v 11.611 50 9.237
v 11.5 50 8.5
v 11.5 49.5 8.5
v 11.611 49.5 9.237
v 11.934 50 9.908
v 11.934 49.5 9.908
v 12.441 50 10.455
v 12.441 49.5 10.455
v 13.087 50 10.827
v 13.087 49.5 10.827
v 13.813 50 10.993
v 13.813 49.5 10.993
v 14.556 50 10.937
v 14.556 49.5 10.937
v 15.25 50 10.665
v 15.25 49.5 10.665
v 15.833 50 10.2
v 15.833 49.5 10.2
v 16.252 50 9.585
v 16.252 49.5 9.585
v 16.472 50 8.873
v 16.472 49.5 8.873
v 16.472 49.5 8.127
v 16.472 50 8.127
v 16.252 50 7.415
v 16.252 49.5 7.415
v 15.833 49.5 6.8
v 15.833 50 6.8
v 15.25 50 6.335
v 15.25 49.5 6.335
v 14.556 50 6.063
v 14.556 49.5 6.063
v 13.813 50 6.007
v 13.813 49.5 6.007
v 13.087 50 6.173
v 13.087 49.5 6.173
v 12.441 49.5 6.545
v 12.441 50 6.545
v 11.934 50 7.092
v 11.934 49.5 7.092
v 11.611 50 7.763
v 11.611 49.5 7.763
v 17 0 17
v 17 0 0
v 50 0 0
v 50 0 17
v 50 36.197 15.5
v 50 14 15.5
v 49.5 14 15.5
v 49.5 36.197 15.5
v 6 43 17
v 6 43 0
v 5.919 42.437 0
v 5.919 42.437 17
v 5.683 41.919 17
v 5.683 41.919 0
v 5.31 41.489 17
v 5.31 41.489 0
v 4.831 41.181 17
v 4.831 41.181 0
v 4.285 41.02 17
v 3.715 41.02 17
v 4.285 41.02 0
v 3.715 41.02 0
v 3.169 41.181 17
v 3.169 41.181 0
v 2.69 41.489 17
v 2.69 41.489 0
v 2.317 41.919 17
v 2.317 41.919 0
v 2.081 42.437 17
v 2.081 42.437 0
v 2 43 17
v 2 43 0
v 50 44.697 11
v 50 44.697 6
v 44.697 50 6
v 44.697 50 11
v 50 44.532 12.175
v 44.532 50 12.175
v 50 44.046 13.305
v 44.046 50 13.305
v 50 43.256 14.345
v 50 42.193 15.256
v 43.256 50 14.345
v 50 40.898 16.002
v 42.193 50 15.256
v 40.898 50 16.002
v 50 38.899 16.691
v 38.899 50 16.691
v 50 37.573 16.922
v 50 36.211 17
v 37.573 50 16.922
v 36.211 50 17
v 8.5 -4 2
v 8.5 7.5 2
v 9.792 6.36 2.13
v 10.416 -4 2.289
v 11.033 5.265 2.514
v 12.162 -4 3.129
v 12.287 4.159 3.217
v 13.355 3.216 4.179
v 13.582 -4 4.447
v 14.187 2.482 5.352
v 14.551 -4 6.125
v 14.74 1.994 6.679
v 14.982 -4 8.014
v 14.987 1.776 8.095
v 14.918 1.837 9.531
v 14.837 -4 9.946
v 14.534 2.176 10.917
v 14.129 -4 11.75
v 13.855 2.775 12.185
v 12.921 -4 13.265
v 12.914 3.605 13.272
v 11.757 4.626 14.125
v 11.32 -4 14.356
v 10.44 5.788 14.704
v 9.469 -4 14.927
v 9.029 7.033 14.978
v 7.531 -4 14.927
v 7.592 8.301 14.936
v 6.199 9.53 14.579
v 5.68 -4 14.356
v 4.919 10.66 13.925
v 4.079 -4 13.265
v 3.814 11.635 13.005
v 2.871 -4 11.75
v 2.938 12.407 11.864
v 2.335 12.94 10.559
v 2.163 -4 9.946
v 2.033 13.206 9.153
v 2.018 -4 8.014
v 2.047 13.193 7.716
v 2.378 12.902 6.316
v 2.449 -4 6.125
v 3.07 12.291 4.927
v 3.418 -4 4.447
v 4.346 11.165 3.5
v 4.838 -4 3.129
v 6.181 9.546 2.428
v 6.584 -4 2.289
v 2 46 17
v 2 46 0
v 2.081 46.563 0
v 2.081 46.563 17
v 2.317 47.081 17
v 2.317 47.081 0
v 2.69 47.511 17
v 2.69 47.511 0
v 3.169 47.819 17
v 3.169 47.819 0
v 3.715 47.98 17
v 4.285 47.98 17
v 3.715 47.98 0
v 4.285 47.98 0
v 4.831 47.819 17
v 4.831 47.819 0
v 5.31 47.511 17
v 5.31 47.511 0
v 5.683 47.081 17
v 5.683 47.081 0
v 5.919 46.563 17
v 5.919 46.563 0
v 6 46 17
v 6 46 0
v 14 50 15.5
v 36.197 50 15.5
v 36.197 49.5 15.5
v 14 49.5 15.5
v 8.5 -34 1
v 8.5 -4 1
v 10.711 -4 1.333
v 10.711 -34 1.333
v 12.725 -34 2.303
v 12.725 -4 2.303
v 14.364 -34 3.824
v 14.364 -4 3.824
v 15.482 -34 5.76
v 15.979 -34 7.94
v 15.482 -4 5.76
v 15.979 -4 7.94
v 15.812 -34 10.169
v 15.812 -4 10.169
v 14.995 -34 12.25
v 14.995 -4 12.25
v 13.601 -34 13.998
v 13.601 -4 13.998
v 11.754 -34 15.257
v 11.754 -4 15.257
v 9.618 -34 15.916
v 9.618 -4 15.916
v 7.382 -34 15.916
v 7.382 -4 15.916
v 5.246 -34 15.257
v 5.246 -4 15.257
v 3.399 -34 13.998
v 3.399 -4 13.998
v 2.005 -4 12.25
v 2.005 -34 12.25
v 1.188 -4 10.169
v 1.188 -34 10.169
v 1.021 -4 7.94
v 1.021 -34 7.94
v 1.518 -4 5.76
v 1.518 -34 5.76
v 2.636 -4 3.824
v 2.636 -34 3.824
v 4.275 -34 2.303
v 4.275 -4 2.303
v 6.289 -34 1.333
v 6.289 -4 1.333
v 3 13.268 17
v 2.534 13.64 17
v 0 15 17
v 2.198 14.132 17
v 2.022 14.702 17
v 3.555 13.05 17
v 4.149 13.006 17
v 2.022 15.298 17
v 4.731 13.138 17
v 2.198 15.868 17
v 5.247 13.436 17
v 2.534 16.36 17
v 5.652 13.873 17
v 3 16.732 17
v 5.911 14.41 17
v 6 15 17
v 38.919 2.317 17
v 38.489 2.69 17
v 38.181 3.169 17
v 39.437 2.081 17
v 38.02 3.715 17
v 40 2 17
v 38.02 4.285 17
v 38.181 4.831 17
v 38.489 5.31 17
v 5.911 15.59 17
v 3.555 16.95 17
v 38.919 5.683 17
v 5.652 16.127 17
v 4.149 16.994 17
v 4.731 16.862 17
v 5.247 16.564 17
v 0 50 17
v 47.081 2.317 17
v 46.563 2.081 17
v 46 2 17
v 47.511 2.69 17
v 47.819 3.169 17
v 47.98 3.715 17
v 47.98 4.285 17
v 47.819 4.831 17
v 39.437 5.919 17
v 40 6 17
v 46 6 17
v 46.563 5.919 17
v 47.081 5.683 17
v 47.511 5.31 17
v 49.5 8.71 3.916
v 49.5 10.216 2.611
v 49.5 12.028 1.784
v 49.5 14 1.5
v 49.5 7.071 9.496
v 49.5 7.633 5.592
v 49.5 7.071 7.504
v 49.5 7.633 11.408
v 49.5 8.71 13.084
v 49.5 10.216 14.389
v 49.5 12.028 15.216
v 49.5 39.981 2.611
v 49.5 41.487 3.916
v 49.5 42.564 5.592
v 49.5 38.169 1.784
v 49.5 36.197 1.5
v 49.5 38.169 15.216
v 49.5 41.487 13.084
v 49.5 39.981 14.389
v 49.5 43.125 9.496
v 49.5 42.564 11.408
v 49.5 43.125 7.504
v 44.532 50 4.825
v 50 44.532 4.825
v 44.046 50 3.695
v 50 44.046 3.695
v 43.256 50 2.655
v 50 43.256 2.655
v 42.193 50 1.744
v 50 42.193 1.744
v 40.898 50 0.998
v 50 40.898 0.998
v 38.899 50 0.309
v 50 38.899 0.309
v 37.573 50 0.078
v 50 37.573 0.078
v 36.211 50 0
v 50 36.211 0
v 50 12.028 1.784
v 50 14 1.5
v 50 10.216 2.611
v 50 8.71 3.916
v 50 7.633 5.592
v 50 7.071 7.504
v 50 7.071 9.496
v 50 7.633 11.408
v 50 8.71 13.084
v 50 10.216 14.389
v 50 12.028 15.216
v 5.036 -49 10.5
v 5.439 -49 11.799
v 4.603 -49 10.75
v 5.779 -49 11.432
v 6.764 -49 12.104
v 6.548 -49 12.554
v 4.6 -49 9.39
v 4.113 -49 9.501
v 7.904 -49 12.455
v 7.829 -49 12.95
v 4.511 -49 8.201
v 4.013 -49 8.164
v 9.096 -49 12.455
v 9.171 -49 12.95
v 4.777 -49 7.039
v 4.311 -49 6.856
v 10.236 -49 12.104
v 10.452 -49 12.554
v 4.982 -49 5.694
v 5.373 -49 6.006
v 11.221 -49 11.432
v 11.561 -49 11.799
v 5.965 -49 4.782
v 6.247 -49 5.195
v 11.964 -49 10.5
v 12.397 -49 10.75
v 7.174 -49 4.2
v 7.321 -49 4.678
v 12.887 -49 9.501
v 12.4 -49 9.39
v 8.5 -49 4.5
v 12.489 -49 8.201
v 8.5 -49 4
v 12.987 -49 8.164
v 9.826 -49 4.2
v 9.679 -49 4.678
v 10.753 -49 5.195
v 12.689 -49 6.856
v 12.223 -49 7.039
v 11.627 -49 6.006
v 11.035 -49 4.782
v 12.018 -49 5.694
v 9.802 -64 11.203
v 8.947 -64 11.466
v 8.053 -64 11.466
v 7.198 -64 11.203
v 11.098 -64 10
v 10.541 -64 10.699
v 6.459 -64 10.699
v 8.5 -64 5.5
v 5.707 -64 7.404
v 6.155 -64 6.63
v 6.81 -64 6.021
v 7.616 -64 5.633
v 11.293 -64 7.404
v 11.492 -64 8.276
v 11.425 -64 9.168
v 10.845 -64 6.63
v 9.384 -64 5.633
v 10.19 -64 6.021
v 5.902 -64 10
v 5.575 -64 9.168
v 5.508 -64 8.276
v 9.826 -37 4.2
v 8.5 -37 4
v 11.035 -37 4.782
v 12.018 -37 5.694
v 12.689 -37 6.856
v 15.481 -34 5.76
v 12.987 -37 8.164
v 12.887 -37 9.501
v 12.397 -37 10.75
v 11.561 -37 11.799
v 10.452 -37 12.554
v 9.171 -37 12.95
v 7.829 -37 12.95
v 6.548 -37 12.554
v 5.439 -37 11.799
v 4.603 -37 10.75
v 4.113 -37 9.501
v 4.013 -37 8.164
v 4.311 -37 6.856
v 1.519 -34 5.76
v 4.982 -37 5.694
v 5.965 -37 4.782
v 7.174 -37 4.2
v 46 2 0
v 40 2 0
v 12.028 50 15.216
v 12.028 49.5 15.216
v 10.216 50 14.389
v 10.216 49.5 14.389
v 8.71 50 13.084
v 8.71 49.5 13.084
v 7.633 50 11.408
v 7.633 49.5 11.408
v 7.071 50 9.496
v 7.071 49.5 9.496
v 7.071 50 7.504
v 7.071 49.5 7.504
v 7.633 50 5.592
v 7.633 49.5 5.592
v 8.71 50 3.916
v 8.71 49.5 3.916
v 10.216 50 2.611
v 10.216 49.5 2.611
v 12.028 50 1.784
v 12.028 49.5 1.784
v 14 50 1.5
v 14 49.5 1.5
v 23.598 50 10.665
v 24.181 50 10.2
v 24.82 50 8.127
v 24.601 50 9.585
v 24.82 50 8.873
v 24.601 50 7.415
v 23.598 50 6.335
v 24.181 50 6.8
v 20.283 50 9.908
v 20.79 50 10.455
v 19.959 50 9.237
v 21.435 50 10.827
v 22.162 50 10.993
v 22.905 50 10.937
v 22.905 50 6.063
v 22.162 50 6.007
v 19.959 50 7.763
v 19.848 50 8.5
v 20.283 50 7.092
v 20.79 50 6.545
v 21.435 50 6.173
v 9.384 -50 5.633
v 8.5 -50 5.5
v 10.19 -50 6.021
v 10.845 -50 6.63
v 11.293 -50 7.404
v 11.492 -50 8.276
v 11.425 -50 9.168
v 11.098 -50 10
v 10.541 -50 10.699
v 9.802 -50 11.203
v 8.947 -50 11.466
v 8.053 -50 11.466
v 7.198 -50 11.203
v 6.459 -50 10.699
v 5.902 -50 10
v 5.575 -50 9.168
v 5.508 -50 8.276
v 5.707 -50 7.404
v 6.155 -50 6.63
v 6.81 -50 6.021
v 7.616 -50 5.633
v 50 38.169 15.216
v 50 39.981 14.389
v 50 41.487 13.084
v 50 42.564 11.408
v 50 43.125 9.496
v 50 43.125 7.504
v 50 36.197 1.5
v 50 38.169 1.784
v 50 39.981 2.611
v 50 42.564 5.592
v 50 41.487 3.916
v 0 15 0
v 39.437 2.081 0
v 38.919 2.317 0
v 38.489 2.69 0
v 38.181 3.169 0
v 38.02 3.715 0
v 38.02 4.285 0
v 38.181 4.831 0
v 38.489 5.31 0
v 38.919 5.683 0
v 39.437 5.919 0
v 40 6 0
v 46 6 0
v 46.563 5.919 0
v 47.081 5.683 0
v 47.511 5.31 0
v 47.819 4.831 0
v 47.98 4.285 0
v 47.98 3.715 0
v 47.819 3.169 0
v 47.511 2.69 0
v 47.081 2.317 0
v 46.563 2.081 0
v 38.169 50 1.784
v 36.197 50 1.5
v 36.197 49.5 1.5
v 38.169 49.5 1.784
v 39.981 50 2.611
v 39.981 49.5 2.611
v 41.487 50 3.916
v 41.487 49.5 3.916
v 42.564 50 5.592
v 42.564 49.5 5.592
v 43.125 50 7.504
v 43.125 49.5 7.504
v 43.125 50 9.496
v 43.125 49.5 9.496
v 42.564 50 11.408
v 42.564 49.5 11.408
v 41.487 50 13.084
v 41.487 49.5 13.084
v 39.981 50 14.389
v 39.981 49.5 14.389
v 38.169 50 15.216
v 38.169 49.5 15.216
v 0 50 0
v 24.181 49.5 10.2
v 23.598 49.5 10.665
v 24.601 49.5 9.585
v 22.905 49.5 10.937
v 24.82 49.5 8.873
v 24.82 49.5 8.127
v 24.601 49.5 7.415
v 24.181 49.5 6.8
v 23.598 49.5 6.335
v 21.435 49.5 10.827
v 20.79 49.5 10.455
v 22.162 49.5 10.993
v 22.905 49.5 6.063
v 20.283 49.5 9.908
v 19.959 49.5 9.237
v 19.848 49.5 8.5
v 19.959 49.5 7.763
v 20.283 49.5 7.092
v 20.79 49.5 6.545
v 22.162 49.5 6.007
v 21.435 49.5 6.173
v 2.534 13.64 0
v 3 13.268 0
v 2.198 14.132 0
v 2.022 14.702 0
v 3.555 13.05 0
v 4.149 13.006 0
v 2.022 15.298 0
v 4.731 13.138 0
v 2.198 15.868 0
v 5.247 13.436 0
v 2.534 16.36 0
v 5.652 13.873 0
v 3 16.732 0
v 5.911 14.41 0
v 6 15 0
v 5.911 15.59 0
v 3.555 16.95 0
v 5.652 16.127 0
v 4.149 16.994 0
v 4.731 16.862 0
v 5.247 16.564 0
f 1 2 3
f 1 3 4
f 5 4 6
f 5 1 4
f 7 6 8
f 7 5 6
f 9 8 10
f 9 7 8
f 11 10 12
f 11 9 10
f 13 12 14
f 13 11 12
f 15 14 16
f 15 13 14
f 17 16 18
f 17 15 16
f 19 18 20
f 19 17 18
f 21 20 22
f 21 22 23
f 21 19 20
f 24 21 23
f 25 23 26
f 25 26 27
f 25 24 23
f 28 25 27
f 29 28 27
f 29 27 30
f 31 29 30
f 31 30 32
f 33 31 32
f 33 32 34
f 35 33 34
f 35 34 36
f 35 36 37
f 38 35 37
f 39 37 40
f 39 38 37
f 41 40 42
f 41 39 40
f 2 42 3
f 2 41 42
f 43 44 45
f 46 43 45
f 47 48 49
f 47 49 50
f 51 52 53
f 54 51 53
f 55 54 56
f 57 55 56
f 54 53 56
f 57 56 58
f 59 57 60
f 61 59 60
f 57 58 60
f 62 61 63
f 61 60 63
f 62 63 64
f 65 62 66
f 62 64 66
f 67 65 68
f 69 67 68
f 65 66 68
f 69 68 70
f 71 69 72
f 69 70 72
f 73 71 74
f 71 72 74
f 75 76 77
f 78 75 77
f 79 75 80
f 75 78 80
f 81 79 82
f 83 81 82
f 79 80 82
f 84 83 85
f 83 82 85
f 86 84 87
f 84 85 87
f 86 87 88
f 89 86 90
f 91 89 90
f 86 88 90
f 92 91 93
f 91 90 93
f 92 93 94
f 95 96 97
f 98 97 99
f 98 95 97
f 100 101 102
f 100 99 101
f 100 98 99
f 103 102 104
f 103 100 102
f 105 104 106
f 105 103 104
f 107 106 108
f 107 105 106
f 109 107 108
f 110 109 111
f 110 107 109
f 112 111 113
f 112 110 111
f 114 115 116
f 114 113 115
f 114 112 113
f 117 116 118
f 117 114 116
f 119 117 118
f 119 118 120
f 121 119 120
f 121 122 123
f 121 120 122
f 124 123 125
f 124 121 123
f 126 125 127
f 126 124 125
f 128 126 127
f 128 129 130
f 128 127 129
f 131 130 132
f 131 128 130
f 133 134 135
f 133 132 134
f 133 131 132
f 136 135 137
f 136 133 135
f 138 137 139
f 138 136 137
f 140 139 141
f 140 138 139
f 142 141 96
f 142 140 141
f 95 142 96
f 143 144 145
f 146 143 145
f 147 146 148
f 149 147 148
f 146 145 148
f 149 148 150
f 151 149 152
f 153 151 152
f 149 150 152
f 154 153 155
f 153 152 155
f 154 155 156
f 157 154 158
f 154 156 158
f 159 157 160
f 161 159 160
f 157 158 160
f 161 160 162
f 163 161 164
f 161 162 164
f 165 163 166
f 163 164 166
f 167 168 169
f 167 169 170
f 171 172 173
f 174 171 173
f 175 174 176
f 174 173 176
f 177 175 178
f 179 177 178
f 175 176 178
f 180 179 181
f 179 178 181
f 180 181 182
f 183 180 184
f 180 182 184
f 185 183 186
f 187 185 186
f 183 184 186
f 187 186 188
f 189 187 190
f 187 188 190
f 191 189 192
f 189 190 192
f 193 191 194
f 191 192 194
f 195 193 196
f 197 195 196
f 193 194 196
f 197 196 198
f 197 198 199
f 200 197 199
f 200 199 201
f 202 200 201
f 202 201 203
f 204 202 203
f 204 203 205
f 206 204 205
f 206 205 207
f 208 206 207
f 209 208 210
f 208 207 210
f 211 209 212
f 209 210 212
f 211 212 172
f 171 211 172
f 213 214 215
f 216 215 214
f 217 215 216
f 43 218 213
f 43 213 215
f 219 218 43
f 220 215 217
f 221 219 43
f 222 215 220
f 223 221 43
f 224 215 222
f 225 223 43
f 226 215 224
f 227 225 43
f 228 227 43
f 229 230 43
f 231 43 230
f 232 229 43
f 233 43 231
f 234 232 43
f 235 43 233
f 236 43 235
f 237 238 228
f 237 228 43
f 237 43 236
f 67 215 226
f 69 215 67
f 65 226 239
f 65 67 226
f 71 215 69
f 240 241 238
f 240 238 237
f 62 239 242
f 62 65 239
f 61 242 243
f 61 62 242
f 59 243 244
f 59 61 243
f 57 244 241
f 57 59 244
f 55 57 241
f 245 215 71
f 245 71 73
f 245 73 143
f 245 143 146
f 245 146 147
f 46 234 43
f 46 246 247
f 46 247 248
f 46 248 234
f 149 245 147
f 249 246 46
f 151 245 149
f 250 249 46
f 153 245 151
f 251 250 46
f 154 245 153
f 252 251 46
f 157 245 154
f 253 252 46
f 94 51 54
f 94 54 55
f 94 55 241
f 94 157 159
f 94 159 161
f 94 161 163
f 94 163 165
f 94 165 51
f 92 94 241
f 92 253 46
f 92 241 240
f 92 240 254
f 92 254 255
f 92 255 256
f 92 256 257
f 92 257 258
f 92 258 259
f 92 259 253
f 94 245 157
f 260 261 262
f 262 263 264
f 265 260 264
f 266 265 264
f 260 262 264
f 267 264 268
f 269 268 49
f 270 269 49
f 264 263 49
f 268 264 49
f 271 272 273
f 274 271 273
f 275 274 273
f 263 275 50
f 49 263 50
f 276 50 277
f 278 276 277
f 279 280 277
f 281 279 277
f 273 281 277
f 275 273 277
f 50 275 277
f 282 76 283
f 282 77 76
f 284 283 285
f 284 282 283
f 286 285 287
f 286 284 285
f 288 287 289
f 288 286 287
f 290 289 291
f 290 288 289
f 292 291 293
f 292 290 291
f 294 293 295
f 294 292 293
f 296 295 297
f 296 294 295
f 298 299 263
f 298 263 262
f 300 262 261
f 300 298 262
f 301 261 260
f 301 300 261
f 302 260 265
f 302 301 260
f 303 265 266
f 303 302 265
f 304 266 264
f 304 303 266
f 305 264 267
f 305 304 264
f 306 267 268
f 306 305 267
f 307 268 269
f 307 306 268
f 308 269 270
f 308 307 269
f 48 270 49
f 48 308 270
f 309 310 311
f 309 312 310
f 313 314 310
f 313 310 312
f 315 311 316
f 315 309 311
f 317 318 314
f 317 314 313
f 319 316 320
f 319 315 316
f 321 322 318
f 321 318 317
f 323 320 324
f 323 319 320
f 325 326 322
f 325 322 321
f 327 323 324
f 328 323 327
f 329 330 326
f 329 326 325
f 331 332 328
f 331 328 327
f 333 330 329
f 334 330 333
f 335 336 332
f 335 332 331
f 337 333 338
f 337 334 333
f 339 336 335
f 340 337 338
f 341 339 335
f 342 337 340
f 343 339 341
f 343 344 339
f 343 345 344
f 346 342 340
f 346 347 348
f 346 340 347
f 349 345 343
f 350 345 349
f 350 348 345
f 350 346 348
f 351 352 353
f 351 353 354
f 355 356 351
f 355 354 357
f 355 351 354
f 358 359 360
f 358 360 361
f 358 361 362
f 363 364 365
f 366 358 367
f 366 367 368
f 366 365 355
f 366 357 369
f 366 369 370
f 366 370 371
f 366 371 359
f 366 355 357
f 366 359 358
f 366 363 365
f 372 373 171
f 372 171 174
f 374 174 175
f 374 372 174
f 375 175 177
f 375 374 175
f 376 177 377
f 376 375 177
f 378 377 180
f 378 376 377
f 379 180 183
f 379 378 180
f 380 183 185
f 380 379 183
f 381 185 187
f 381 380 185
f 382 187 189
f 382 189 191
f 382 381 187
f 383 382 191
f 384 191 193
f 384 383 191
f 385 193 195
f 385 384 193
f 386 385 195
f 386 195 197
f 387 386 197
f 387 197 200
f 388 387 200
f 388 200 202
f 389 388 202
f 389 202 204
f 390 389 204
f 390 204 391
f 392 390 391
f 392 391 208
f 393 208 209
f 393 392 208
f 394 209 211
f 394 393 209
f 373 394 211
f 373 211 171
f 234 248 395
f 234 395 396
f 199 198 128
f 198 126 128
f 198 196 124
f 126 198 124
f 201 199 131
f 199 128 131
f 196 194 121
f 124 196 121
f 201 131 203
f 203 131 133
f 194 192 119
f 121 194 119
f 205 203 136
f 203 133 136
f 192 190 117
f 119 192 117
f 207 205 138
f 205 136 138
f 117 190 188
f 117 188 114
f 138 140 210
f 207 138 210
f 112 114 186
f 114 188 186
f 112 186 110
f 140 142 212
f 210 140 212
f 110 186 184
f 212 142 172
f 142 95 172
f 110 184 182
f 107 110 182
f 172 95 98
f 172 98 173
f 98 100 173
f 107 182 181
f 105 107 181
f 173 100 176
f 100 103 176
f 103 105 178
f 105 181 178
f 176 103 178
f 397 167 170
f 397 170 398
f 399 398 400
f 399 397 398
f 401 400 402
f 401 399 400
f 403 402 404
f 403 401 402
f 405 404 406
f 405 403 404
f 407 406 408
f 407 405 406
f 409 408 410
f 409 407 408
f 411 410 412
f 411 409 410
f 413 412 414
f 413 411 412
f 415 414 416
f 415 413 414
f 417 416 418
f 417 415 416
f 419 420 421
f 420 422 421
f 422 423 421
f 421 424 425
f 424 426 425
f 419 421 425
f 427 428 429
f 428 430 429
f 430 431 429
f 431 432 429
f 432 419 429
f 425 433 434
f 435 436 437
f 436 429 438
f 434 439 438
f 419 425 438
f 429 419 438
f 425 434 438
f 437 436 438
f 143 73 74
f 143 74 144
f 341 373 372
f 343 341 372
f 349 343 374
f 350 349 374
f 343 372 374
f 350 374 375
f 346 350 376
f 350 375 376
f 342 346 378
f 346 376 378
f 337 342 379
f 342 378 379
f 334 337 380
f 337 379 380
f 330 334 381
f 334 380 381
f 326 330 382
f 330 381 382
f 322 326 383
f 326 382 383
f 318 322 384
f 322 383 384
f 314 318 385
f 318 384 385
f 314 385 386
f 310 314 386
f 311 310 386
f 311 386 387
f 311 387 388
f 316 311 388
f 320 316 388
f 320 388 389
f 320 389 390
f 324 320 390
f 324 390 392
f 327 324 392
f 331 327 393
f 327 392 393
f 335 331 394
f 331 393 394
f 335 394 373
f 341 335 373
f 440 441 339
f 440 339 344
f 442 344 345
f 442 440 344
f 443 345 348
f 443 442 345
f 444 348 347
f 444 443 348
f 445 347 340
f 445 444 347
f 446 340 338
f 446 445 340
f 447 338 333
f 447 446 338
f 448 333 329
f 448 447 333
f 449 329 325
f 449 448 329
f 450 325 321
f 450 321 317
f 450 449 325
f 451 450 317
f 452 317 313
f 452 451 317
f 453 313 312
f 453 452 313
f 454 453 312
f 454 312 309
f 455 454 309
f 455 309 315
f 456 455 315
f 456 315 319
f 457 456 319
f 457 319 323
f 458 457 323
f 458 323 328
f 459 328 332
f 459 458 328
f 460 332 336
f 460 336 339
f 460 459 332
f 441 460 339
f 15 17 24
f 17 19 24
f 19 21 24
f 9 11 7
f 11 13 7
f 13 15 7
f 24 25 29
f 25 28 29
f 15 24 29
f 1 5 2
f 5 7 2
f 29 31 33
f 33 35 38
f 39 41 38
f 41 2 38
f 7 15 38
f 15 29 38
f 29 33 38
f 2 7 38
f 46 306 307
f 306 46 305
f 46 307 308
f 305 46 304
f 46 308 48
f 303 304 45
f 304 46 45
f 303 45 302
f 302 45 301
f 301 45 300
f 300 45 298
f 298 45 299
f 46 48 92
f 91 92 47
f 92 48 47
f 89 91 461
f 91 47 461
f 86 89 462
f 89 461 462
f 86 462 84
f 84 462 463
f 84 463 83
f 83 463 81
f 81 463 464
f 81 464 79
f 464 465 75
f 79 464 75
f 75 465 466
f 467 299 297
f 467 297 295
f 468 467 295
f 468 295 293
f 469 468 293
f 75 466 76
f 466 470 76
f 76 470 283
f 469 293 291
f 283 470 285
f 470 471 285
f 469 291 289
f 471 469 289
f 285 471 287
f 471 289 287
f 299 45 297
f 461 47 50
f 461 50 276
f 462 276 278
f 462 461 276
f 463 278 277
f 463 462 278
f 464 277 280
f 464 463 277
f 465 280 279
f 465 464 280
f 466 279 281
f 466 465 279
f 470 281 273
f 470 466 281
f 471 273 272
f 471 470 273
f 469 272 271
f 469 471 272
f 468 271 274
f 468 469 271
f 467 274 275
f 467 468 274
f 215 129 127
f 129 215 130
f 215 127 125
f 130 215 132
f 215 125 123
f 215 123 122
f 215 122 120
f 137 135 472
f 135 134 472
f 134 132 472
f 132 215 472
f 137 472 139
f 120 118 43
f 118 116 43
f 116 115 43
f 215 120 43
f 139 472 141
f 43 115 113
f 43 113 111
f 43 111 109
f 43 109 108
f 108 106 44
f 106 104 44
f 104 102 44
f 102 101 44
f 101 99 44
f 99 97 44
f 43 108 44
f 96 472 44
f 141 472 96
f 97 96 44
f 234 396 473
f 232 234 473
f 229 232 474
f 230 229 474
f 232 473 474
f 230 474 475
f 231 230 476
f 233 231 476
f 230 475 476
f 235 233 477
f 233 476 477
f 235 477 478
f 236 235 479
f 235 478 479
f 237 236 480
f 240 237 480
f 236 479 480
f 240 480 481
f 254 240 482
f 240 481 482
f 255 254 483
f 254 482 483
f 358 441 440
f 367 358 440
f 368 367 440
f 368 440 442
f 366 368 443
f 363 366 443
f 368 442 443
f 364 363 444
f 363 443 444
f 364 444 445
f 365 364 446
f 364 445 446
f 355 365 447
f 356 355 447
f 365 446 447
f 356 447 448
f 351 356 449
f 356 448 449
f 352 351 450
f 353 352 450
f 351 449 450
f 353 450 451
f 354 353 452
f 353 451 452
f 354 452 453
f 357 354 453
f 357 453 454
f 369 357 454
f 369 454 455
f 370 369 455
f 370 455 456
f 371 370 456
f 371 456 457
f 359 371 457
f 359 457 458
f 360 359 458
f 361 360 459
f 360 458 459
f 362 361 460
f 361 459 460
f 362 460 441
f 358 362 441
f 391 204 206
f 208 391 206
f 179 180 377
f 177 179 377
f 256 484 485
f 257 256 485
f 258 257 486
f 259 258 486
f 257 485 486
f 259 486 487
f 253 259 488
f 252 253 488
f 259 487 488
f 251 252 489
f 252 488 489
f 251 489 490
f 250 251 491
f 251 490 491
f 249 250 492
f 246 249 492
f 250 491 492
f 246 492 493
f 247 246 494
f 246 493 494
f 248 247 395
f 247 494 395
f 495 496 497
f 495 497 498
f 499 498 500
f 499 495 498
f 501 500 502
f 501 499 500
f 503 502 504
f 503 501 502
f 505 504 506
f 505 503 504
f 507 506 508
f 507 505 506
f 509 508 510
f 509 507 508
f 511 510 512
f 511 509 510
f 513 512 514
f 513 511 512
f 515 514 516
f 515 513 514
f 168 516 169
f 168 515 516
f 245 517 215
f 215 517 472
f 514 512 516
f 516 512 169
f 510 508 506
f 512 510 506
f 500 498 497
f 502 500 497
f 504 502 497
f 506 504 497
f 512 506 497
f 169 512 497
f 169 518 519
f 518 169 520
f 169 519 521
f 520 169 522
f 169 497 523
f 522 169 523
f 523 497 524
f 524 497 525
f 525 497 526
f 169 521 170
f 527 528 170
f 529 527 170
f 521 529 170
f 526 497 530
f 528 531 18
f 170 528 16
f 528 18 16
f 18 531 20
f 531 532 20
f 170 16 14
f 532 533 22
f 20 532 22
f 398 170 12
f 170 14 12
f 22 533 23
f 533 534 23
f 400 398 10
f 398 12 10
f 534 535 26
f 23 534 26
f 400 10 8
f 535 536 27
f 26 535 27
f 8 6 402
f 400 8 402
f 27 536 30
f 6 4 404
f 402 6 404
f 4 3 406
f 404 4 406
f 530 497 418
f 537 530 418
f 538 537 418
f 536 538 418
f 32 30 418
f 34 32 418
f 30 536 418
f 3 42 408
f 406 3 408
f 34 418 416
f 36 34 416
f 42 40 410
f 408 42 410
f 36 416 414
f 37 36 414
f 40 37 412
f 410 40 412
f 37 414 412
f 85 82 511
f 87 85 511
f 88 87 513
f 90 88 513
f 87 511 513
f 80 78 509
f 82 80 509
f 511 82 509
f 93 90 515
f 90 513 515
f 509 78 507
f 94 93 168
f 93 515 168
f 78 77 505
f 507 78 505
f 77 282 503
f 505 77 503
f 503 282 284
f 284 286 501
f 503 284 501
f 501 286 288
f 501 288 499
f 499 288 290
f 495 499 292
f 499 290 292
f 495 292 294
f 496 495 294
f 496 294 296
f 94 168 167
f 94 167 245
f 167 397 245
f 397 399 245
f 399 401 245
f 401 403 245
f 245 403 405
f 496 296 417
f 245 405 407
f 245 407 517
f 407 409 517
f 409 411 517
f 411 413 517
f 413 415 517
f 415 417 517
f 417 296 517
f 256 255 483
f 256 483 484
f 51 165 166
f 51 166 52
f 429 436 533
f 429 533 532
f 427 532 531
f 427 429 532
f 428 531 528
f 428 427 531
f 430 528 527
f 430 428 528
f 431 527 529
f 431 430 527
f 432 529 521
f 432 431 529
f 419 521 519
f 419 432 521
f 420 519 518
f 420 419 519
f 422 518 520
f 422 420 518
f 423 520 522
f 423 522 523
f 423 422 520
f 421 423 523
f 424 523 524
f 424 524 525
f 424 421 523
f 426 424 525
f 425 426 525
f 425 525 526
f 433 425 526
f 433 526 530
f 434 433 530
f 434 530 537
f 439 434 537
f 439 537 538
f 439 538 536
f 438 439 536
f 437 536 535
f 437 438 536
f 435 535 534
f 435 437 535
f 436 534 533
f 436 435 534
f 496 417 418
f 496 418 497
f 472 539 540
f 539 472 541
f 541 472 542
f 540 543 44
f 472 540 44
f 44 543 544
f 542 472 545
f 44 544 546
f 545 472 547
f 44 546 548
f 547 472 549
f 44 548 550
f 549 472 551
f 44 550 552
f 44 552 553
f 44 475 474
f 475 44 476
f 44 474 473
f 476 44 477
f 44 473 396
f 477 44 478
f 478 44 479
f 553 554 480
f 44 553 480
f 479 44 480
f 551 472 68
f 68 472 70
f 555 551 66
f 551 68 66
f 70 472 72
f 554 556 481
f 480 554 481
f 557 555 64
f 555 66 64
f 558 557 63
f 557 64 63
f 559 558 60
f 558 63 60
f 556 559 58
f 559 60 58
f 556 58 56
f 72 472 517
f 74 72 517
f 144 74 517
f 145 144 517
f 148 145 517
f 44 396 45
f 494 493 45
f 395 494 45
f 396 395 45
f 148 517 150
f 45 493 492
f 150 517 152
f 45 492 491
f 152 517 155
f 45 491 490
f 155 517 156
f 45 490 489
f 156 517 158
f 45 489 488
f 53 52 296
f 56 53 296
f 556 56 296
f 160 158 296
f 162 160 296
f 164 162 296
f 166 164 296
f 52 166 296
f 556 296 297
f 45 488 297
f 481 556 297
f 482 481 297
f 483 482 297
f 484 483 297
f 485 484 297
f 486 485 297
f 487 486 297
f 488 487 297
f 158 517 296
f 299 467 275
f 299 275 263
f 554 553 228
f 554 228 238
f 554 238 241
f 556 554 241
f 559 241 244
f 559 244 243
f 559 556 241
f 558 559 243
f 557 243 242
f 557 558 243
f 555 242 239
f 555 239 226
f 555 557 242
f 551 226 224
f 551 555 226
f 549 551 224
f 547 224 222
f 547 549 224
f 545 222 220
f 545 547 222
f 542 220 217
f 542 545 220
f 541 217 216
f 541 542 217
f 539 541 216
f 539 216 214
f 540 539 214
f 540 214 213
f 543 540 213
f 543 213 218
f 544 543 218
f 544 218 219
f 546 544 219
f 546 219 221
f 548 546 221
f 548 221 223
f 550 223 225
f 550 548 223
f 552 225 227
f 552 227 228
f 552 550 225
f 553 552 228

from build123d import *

# Parameters (mm, degrees)
ESQUISSE1_R                  = 2
EXTRUSION1_DEPTH             = 17
CONG_1_R                     = 6
ESQUISSE5_R                  = 6.5
EXTRUSION3_DEPTH             = 4
EXTRUSION3_DIRECTION_2_REACH = 74.726
ESQUISSE6_R                  = 7.5
EXTRUSION4_DEPTH             = 30
ESQUISSE7_R                  = 4.5
EXTRUSION5_DEPTH             = 15
CHANFREIN2_SIZE              = 3
ESQUISSE8_R                  = 3
EXTRUSION6_DEPTH             = 15
CHANFREIN3_SIZE              = 1
EXTRUSION7_DEPTH             = 0.5
ESQUISSE10_R                 = 2.5
EXTRUSION8_DEPTH             = 0.5


with BuildPart() as part:
    # Esquisse1 → Extrusion1 (new body)
    with BuildSketch(Plane.XY):
        Polygon((0, 50), (0, 15), (17, 0), (50, 0), (50, 44.696699141), (44.696699141, 50), align=None)
        with Locations((4, 15)):
            Circle(ESQUISSE1_R, mode=Mode.SUBTRACT)
        with BuildLine():
            Line((2, 43), (2, 46))
            ThreePointArc((2, 46), (4, 48), (6, 46))
            Line((6, 46), (6, 43))
            ThreePointArc((6, 43), (4, 41), (2, 43))
        make_face(mode=Mode.SUBTRACT)
        with BuildLine():
            Line((40, 6), (46, 6))
            ThreePointArc((46, 6), (48, 4), (46, 2))
            Line((46, 2), (40, 2))
            ThreePointArc((40, 2), (38, 4), (40, 6))
        make_face(mode=Mode.SUBTRACT)
    extrude(amount=EXTRUSION1_DEPTH)

    # Congé1
    cong_1_edges = [part.edges().sort_by_distance(p)[0] for p in [
        (47.348349571, 47.348349571, 17),
        (47.348349571, 47.348349571, 0),
    ]]
    fillet(cong_1_edges, radius=CONG_1_R)

    # Esquisse5 → Extrusion3 (add)
    with BuildSketch(Plane.XZ):
        with Locations(Location((8.5, 8.5, 0), (0, 0, 270))):
            Circle(ESQUISSE5_R)
    extrude(amount=EXTRUSION3_DEPTH)

    # Esquisse5 → Extrusion3 direction 2 (add, up to next)
    with BuildSketch(Plane.XZ, mode=Mode.PRIVATE) as extrusion3_direction_2_sk1:
        with Locations(Location((8.5, 8.5, 0), (0, 0, 270))):
            Circle(ESQUISSE5_R)
    extrusion3_direction_2_tool1 = extrude(extrusion3_direction_2_sk1.sketch, amount=-EXTRUSION3_DIRECTION_2_REACH, mode=Mode.PRIVATE) - part.part
    add(extrusion3_direction_2_tool1.solids().sort_by_distance((8.5, 0, 8.5))[0])

    # Esquisse6 → Extrusion4 (add)
    with BuildSketch(Plane.XZ.offset(4)):
        with Locations(Location((8.5, 8.5, 0), (0, 0, 270))):
            Circle(ESQUISSE6_R)
    extrude(amount=EXTRUSION4_DEPTH)

    # Esquisse7 → Extrusion5 (add)
    with BuildSketch(Plane.XZ.offset(34)):
        with Locations(Location((8.5, 8.5, 0), (0, 0, 270))):
            Circle(ESQUISSE7_R)
    extrude(amount=EXTRUSION5_DEPTH)

    # Chanfrein2
    chanfrein2_edges = [part.edges().sort_by_distance(p)[0] for p in [
        (8.5, -34, 13),
    ]]
    chamfer(chanfrein2_edges, length=CHANFREIN2_SIZE - 0.0001)  # a hair under: the kernel refuses the full size

    # Esquisse8 → Extrusion6 (add)
    with BuildSketch(Plane.XZ.offset(49)):
        with Locations(Location((8.5, 8.5, 0), (0, 0, 270))):
            Circle(ESQUISSE8_R)
    extrude(amount=EXTRUSION6_DEPTH)

    # Chanfrein3
    chanfrein3_edges = [part.edges().sort_by_distance(p)[0] for p in [
        (8.5, -49, 11.5),
    ]]
    chamfer(chanfrein3_edges, length=CHANFREIN3_SIZE)

    # Esquisse9 → Extrusion7 (cut)
    with BuildSketch(Plane(origin=(50, 0, 0), x_dir=(0, 0, -1), z_dir=(1, 0, 0))):
        with BuildLine():
            Line((-15.5, 14), (-15.5, 36.196699141))
            ThreePointArc((-15.5, 36.196699141), (-8.5, 43.196699141), (-1.5, 36.196699141))
            Line((-1.5, 36.196699141), (-1.5, 14))
            ThreePointArc((-1.5, 14), (-8.5, 7), (-15.5, 14))
        make_face()
    extrude(amount=-EXTRUSION7_DEPTH, mode=Mode.SUBTRACT)

    # Esquisse10 → Extrusion8 (cut)
    with BuildSketch(Plane(origin=(0, 50, 0), x_dir=(1, 0, 0), z_dir=(0, 1, 0))):
        with BuildLine():
            Line((14, -1.5), (36.196699141, -1.5))
            ThreePointArc((36.196699141, -1.5), (43.196699141, -8.5), (36.196699141, -15.5))
            Line((36.196699141, -15.5), (14, -15.5))
            ThreePointArc((14, -15.5), (7, -8.5), (14, -1.5))
        make_face()
        with Locations(Location((14, -8.5, 0), (0, 0, 180))):
            Circle(ESQUISSE10_R, mode=Mode.SUBTRACT)
        with Locations(Location((22.348349571, -8.5, 0), (0, 0, 180))):
            Circle(ESQUISSE10_R, mode=Mode.SUBTRACT)
    extrude(amount=-EXTRUSION8_DEPTH, mode=Mode.SUBTRACT)


solid = part.part
